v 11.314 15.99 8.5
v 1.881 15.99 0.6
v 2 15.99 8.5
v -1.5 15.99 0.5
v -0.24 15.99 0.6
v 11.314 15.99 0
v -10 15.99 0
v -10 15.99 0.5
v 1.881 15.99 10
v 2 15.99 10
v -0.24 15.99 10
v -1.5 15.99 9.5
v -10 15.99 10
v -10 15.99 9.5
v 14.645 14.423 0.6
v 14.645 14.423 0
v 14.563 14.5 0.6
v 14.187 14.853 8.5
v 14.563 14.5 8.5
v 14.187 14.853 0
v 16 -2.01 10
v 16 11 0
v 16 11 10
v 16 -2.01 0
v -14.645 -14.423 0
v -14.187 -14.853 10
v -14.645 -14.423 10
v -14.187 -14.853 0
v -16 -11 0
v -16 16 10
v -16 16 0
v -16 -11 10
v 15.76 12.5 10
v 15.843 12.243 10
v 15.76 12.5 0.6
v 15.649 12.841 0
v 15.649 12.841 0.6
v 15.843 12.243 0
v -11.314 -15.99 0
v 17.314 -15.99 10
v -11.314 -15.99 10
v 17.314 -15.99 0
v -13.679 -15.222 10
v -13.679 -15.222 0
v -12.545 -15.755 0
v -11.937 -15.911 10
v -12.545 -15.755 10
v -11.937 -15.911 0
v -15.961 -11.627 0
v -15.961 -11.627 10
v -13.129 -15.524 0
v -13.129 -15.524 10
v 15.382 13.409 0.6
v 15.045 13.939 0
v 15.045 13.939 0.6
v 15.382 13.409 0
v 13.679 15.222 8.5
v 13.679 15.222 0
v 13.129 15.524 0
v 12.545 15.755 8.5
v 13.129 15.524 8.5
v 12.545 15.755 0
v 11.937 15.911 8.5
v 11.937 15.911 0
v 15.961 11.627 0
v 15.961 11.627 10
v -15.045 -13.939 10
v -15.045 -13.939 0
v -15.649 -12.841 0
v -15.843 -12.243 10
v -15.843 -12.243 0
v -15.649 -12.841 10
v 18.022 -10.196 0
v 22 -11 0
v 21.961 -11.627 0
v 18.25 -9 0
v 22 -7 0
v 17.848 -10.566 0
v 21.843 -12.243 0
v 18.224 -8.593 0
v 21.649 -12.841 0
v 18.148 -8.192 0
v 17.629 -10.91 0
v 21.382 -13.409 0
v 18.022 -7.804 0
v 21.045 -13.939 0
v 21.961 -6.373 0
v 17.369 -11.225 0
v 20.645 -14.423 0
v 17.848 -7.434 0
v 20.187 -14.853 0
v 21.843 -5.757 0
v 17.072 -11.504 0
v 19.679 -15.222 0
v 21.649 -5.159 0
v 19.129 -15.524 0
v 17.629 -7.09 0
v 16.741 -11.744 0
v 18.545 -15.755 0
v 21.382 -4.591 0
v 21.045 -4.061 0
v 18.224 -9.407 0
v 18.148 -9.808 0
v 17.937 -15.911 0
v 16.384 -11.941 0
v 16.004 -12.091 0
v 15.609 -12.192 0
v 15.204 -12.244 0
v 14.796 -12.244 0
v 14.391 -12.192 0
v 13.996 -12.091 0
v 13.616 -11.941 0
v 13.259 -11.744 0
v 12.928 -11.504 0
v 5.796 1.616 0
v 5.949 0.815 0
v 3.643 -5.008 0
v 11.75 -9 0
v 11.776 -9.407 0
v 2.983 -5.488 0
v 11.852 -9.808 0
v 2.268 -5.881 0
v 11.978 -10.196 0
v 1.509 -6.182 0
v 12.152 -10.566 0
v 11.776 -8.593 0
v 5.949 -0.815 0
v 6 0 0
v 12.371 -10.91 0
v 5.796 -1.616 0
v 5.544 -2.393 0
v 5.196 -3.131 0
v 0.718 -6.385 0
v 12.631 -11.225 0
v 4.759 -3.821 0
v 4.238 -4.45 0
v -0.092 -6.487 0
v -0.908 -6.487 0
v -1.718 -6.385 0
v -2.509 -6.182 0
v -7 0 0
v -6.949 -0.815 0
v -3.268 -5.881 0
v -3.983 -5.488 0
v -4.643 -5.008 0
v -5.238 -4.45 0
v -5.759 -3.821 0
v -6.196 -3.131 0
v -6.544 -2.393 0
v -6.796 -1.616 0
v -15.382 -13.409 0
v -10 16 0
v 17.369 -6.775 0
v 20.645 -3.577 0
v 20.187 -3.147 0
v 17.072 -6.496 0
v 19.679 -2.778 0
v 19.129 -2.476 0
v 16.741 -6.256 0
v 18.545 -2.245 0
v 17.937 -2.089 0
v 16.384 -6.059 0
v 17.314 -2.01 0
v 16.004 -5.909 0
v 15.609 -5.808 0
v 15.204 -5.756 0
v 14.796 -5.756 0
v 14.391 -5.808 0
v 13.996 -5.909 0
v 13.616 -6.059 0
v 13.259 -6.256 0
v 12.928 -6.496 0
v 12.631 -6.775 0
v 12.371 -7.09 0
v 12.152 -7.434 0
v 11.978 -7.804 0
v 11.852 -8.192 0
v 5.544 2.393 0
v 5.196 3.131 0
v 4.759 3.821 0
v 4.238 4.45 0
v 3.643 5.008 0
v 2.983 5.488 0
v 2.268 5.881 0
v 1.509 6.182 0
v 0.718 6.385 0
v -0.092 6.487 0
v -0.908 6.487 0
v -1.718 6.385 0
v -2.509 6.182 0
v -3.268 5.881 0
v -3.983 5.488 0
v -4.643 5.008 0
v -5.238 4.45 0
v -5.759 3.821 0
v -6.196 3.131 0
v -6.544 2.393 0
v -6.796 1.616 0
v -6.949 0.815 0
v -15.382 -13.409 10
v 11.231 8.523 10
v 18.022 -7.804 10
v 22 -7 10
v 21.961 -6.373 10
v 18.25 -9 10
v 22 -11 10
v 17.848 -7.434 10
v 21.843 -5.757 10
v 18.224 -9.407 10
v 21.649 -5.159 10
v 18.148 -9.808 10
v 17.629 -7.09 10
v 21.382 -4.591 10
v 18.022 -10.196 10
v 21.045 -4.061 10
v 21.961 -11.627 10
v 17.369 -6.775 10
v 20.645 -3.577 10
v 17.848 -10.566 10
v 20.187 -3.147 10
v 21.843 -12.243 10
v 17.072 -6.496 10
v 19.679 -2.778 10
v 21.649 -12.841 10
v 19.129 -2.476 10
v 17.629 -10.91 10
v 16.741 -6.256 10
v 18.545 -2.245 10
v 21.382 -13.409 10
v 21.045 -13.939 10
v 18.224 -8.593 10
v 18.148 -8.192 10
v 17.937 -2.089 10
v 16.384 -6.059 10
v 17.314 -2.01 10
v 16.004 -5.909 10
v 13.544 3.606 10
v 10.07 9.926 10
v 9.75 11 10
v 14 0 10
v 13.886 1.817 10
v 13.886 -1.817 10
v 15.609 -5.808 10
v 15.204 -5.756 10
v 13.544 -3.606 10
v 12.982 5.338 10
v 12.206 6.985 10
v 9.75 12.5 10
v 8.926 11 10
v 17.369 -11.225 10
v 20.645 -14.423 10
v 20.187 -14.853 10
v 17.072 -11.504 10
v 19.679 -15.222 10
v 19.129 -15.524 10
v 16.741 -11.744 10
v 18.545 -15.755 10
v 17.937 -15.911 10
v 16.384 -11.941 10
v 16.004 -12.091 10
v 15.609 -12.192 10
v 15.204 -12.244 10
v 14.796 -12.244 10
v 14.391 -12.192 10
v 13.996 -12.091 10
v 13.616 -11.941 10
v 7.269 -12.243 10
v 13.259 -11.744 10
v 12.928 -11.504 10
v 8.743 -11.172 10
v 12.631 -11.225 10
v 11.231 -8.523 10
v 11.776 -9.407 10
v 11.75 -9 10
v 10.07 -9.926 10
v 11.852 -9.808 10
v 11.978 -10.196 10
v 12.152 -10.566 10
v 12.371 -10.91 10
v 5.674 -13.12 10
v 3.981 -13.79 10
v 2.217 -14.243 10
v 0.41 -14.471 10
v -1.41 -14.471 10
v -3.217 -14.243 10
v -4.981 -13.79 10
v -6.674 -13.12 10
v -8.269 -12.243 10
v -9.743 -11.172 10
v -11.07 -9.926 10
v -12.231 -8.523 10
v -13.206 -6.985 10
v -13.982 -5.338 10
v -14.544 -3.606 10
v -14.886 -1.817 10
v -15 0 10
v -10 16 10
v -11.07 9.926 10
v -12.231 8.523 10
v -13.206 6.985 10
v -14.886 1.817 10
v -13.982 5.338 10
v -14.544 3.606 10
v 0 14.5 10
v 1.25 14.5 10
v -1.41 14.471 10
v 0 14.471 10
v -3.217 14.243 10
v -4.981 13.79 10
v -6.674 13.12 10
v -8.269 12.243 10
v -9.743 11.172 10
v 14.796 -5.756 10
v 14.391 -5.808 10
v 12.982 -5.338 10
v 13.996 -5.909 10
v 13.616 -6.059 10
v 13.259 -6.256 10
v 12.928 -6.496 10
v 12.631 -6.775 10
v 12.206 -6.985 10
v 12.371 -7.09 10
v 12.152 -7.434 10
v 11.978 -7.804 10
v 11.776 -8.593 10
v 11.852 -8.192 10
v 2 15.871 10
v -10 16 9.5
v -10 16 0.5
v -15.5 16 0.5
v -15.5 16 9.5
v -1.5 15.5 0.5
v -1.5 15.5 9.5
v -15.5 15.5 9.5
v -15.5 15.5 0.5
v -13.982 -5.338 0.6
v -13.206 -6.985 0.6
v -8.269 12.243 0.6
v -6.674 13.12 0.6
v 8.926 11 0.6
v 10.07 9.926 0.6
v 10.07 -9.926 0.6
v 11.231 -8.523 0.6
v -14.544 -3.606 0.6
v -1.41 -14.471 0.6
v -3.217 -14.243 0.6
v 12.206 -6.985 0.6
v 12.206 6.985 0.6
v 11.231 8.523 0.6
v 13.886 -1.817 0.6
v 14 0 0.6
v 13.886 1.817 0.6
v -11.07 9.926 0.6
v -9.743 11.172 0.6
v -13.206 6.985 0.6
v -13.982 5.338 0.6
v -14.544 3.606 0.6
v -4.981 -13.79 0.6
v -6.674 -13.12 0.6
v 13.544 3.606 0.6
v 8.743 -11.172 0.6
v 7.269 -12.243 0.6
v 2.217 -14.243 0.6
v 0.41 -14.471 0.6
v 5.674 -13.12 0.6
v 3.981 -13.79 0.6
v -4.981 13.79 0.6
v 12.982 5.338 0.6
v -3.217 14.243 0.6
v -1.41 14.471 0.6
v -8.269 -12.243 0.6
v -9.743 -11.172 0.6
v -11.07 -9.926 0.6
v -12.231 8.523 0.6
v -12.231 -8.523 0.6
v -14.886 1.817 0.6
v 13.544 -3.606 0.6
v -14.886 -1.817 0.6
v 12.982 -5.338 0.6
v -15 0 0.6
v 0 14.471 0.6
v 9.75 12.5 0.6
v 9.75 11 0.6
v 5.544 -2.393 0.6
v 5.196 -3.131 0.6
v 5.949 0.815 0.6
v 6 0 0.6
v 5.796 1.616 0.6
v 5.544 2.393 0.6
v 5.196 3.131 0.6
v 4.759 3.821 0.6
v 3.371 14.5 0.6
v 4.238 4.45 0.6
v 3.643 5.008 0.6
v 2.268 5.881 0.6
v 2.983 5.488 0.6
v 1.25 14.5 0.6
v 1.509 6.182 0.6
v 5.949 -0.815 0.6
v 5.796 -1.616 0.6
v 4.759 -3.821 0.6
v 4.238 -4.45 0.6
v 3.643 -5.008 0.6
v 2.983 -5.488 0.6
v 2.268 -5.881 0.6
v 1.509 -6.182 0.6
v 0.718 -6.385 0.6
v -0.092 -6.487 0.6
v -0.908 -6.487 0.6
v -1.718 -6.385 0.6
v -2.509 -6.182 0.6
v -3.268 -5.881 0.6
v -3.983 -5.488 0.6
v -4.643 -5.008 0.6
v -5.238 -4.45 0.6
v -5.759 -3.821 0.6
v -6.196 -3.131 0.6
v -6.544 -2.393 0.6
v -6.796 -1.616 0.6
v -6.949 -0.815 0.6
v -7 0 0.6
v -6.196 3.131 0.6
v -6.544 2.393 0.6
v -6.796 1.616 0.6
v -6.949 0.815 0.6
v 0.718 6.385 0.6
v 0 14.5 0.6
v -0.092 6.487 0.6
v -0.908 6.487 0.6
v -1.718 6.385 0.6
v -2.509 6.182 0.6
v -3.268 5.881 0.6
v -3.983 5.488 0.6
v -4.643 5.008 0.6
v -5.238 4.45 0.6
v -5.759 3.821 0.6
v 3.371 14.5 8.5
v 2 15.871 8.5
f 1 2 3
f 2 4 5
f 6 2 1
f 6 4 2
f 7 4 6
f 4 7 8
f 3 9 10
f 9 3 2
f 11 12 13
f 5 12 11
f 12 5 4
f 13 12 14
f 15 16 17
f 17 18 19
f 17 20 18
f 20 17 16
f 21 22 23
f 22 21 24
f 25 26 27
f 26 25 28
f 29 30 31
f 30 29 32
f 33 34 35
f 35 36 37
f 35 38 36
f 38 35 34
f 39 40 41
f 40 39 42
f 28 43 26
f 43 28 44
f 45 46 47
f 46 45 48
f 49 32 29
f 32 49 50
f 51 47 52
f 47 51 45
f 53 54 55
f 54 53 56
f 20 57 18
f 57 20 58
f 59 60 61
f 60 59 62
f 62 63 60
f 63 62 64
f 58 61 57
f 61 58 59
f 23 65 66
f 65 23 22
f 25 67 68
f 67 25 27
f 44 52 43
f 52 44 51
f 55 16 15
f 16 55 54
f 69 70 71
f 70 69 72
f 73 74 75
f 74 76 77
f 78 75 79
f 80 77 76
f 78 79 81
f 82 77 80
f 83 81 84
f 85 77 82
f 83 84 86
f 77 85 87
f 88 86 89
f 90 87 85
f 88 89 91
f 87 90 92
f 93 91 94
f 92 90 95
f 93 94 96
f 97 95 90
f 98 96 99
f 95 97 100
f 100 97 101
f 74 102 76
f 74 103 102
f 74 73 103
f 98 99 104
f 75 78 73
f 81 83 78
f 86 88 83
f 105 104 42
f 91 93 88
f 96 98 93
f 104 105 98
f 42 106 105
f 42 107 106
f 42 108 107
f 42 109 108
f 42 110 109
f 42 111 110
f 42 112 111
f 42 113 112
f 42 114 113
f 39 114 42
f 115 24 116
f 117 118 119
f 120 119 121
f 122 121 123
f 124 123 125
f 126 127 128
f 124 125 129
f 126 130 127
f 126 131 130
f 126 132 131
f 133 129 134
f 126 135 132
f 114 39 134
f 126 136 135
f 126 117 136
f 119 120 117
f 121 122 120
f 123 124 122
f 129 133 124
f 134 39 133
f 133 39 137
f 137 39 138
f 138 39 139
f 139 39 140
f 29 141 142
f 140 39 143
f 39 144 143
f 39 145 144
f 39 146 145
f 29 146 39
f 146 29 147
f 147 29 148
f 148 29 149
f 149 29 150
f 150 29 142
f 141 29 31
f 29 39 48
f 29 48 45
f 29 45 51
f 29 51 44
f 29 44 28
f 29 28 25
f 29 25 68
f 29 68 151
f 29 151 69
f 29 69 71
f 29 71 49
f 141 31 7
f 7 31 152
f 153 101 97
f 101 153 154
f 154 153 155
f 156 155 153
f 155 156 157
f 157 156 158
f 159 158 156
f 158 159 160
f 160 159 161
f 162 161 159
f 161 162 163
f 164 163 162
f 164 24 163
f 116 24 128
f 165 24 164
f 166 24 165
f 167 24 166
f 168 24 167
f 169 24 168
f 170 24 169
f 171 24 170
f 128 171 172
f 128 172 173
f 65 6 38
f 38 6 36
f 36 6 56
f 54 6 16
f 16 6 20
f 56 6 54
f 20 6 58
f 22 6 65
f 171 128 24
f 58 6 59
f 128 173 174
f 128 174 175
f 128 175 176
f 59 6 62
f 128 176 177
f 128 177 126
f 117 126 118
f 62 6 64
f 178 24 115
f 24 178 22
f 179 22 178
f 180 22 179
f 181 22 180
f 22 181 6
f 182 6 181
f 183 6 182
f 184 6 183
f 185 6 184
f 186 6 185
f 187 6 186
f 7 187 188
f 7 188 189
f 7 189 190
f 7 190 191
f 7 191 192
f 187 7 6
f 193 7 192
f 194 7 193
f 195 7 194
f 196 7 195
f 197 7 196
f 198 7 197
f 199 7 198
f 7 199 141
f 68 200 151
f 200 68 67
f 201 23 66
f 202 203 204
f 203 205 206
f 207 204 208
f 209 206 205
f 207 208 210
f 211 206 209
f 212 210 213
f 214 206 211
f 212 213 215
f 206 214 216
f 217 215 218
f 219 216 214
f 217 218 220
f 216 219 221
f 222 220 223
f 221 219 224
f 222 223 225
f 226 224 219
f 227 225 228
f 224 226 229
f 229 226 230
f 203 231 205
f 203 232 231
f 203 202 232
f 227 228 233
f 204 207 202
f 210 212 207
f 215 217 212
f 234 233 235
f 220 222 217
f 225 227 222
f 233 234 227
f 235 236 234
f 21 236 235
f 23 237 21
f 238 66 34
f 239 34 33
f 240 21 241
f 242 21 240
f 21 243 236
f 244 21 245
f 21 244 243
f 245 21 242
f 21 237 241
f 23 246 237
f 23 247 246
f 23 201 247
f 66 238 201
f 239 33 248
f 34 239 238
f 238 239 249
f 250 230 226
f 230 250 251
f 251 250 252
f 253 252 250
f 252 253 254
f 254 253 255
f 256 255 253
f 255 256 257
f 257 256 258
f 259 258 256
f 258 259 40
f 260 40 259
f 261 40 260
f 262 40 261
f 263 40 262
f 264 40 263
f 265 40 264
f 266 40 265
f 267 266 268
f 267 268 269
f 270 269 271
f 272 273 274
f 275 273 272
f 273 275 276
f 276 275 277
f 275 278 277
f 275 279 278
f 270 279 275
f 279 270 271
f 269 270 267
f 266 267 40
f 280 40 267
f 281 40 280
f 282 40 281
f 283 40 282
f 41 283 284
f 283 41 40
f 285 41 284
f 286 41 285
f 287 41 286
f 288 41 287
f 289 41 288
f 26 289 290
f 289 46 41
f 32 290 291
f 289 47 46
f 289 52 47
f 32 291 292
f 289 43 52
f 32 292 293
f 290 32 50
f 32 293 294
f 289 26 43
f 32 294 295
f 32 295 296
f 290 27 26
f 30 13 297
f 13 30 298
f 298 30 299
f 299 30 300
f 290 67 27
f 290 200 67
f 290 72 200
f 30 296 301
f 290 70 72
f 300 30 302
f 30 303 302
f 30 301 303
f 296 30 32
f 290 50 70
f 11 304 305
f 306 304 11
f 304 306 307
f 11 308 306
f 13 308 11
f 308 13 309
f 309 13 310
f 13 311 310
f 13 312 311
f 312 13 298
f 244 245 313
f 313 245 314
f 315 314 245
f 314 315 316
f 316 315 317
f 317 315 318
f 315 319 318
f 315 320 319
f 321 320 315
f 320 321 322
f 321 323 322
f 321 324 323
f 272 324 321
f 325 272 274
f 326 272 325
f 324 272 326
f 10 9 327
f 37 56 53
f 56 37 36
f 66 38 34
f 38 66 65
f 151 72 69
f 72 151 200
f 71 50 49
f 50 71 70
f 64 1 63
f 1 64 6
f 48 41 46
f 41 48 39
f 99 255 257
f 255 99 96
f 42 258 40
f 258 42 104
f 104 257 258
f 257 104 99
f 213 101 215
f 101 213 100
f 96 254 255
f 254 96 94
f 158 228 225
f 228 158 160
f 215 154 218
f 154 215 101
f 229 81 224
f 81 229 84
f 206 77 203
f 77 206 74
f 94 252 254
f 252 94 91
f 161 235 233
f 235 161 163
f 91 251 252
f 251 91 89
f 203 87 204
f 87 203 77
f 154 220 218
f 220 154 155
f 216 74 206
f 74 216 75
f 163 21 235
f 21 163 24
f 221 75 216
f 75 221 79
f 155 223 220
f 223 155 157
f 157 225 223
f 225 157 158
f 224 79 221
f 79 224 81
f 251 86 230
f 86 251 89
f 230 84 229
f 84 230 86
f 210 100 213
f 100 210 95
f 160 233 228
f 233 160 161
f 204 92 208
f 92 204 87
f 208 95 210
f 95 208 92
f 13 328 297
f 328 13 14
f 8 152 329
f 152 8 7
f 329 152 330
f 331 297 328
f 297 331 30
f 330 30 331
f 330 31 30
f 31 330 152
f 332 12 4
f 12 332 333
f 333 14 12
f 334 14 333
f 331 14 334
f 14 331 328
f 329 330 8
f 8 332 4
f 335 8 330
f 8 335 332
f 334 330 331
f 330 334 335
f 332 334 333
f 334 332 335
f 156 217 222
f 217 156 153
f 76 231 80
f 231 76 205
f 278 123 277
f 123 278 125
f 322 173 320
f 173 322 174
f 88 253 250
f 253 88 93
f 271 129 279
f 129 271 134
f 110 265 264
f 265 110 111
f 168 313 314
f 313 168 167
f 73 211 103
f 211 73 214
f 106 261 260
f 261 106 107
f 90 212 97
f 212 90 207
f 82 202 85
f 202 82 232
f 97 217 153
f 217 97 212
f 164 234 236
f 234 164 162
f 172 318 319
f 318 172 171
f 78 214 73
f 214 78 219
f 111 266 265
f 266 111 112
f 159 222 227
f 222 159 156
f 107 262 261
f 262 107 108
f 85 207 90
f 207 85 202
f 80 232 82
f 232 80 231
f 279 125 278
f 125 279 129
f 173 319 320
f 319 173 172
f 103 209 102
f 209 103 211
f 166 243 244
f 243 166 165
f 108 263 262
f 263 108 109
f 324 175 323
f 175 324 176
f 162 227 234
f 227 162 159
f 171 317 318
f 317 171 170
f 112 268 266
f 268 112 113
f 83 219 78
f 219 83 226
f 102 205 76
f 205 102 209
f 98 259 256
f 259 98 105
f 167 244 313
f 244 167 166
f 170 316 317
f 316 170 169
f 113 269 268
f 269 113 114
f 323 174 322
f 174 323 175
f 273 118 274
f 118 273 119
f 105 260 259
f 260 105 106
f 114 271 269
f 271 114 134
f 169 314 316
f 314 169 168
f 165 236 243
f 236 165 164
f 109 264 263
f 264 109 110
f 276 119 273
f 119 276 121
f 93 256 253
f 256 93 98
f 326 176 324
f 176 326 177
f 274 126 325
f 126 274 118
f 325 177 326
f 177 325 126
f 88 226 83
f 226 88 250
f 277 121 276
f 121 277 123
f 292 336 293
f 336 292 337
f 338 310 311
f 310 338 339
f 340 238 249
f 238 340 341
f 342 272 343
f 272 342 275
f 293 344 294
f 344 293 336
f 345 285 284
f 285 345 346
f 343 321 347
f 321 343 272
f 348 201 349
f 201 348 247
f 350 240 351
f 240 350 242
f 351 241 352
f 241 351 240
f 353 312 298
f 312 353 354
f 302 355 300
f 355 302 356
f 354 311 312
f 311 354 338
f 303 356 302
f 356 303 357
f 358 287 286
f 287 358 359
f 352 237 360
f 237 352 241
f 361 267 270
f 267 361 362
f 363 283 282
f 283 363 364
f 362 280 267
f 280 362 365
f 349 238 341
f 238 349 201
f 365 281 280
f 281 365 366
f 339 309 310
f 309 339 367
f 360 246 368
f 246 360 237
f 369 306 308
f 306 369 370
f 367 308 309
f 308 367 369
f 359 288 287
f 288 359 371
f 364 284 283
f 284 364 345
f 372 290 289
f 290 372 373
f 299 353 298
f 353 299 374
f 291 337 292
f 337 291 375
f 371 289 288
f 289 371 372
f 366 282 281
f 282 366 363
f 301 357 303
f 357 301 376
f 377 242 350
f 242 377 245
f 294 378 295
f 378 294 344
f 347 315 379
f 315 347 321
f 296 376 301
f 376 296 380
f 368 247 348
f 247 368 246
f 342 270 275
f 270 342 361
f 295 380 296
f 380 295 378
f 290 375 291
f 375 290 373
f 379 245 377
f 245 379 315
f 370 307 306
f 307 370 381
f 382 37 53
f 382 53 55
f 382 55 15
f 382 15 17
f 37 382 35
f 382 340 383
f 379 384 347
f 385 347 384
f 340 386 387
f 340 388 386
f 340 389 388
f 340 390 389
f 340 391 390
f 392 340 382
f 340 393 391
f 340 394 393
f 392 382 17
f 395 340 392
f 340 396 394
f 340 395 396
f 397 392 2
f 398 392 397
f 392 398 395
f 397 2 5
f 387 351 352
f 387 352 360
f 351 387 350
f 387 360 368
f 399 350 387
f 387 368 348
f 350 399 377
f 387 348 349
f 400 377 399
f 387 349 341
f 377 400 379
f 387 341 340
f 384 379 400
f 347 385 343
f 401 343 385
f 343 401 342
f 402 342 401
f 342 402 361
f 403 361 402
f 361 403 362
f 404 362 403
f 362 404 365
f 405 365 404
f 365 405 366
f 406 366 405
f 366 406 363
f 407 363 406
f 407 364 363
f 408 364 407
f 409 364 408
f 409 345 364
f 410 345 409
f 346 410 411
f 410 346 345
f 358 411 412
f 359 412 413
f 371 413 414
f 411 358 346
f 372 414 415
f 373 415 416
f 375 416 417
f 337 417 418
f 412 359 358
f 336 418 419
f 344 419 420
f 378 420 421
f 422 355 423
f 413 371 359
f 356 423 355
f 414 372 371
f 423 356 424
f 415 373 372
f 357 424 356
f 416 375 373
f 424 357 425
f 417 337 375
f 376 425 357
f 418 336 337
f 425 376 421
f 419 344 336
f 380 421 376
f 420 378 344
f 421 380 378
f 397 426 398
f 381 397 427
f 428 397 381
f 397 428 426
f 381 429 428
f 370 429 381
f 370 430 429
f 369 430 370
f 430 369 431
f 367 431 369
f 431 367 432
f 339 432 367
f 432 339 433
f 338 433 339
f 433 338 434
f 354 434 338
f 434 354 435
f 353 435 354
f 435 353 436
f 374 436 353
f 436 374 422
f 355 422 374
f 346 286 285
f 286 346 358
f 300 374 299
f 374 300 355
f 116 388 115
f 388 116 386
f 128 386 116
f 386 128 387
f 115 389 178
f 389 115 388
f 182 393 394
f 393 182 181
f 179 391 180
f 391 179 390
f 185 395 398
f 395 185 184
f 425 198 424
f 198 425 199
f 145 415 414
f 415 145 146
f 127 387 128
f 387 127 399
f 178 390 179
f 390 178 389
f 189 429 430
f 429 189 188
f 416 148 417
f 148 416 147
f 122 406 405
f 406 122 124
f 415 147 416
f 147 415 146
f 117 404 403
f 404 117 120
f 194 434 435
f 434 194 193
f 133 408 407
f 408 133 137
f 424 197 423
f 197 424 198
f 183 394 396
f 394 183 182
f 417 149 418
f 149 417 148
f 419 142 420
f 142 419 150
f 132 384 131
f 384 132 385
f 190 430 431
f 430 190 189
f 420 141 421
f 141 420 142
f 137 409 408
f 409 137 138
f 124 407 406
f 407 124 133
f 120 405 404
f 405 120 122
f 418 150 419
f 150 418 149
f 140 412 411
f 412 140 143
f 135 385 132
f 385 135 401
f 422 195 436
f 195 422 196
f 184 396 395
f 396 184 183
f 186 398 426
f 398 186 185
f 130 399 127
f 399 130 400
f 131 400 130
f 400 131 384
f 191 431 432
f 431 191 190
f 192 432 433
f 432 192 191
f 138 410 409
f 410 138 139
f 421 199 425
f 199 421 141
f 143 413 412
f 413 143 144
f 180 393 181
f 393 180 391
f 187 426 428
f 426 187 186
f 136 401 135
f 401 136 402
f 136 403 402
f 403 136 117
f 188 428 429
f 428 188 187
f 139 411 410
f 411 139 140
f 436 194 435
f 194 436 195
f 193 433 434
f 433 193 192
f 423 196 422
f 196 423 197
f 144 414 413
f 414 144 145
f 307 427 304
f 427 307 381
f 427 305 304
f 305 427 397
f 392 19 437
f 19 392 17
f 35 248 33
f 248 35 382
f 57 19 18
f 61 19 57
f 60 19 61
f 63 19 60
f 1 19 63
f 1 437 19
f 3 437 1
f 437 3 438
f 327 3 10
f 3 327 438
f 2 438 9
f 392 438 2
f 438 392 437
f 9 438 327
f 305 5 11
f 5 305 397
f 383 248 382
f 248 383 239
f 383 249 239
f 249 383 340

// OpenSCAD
$fn = 50;


difference() {
	union() {
		hull() {
			translate(v = [-11.0000000000, 11.0000000000, 0]) {
				cylinder(h = 10, r = 5);
			}
			translate(v = [11.0000000000, 11.0000000000, 0]) {
				cylinder(h = 10, r = 5);
			}
			translate(v = [-11.0000000000, -11.0000000000, 0]) {
				cylinder(h = 10, r = 5);
			}
			translate(v = [11.0000000000, -11.0000000000, 0]) {
				cylinder(h = 10, r = 5);
			}
		}
		translate(v = [7.5000000000, -9.0000000000, 0]) {
			hull() {
				translate(v = [-9.5000000000, 2.0000000000, 0]) {
					cylinder(h = 10, r = 5);
				}
				translate(v = [9.5000000000, 2.0000000000, 0]) {
					cylinder(h = 10, r = 5);
				}
				translate(v = [-9.5000000000, -2.0000000000, 0]) {
					cylinder(h = 10, r = 5);
				}
				translate(v = [9.5000000000, -2.0000000000, 0]) {
					cylinder(h = 10, r = 5);
				}
			}
		}
		translate(v = [-16.0000000000, 10.0000000000, 0]) {
			cube(size = [6, 6, 10]);
		}
	}
	union() {
		translate(v = [-15.5000000000, 15.5000000000, 0.5000000000]) {
			cube(size = [14, 0.5000000000, 9.0000000000]);
		}
		translate(v = [15.0000000000, -9.0000000000, -50.0000000000]) {
			cylinder(h = 100, r = 3.2500000000);
		}
		translate(v = [-0.5000000000, 0.0000000000, 0.6000000000]) {
			cylinder(h = 12.4000000000, r = 14.5000000000);
		}
		translate(v = [-0.5000000000, 0.0000000000, -5.0000000000]) {
			cylinder(h = 10, r = 6.5000000000);
		}
		translate(v = [0.0000000000, 12.5000000000, 0.6000000000]) {
			cube(size = [16.0000000000, 2, 12.4000000000]);
		}
		translate(v = [2.0000000000, 12.5000000000, 8.5000000000]) {
			cube(size = [14.0000000000, 5, 1.5000000000]);
		}
		translate(v = [-3.0000000000, 18.7500000000, 0.6000000000]) {
			rotate(a = [0, 0, -45]) {
				cube(size = [10, 1.5000000000, 12.4000000000]);
			}
		}
		translate(v = [2.2500000000, 11.0000000000, 0.6000000000]) {
			cube(size = [7.5000000000, 2, 9.4000000000]);
		}
	}
}
